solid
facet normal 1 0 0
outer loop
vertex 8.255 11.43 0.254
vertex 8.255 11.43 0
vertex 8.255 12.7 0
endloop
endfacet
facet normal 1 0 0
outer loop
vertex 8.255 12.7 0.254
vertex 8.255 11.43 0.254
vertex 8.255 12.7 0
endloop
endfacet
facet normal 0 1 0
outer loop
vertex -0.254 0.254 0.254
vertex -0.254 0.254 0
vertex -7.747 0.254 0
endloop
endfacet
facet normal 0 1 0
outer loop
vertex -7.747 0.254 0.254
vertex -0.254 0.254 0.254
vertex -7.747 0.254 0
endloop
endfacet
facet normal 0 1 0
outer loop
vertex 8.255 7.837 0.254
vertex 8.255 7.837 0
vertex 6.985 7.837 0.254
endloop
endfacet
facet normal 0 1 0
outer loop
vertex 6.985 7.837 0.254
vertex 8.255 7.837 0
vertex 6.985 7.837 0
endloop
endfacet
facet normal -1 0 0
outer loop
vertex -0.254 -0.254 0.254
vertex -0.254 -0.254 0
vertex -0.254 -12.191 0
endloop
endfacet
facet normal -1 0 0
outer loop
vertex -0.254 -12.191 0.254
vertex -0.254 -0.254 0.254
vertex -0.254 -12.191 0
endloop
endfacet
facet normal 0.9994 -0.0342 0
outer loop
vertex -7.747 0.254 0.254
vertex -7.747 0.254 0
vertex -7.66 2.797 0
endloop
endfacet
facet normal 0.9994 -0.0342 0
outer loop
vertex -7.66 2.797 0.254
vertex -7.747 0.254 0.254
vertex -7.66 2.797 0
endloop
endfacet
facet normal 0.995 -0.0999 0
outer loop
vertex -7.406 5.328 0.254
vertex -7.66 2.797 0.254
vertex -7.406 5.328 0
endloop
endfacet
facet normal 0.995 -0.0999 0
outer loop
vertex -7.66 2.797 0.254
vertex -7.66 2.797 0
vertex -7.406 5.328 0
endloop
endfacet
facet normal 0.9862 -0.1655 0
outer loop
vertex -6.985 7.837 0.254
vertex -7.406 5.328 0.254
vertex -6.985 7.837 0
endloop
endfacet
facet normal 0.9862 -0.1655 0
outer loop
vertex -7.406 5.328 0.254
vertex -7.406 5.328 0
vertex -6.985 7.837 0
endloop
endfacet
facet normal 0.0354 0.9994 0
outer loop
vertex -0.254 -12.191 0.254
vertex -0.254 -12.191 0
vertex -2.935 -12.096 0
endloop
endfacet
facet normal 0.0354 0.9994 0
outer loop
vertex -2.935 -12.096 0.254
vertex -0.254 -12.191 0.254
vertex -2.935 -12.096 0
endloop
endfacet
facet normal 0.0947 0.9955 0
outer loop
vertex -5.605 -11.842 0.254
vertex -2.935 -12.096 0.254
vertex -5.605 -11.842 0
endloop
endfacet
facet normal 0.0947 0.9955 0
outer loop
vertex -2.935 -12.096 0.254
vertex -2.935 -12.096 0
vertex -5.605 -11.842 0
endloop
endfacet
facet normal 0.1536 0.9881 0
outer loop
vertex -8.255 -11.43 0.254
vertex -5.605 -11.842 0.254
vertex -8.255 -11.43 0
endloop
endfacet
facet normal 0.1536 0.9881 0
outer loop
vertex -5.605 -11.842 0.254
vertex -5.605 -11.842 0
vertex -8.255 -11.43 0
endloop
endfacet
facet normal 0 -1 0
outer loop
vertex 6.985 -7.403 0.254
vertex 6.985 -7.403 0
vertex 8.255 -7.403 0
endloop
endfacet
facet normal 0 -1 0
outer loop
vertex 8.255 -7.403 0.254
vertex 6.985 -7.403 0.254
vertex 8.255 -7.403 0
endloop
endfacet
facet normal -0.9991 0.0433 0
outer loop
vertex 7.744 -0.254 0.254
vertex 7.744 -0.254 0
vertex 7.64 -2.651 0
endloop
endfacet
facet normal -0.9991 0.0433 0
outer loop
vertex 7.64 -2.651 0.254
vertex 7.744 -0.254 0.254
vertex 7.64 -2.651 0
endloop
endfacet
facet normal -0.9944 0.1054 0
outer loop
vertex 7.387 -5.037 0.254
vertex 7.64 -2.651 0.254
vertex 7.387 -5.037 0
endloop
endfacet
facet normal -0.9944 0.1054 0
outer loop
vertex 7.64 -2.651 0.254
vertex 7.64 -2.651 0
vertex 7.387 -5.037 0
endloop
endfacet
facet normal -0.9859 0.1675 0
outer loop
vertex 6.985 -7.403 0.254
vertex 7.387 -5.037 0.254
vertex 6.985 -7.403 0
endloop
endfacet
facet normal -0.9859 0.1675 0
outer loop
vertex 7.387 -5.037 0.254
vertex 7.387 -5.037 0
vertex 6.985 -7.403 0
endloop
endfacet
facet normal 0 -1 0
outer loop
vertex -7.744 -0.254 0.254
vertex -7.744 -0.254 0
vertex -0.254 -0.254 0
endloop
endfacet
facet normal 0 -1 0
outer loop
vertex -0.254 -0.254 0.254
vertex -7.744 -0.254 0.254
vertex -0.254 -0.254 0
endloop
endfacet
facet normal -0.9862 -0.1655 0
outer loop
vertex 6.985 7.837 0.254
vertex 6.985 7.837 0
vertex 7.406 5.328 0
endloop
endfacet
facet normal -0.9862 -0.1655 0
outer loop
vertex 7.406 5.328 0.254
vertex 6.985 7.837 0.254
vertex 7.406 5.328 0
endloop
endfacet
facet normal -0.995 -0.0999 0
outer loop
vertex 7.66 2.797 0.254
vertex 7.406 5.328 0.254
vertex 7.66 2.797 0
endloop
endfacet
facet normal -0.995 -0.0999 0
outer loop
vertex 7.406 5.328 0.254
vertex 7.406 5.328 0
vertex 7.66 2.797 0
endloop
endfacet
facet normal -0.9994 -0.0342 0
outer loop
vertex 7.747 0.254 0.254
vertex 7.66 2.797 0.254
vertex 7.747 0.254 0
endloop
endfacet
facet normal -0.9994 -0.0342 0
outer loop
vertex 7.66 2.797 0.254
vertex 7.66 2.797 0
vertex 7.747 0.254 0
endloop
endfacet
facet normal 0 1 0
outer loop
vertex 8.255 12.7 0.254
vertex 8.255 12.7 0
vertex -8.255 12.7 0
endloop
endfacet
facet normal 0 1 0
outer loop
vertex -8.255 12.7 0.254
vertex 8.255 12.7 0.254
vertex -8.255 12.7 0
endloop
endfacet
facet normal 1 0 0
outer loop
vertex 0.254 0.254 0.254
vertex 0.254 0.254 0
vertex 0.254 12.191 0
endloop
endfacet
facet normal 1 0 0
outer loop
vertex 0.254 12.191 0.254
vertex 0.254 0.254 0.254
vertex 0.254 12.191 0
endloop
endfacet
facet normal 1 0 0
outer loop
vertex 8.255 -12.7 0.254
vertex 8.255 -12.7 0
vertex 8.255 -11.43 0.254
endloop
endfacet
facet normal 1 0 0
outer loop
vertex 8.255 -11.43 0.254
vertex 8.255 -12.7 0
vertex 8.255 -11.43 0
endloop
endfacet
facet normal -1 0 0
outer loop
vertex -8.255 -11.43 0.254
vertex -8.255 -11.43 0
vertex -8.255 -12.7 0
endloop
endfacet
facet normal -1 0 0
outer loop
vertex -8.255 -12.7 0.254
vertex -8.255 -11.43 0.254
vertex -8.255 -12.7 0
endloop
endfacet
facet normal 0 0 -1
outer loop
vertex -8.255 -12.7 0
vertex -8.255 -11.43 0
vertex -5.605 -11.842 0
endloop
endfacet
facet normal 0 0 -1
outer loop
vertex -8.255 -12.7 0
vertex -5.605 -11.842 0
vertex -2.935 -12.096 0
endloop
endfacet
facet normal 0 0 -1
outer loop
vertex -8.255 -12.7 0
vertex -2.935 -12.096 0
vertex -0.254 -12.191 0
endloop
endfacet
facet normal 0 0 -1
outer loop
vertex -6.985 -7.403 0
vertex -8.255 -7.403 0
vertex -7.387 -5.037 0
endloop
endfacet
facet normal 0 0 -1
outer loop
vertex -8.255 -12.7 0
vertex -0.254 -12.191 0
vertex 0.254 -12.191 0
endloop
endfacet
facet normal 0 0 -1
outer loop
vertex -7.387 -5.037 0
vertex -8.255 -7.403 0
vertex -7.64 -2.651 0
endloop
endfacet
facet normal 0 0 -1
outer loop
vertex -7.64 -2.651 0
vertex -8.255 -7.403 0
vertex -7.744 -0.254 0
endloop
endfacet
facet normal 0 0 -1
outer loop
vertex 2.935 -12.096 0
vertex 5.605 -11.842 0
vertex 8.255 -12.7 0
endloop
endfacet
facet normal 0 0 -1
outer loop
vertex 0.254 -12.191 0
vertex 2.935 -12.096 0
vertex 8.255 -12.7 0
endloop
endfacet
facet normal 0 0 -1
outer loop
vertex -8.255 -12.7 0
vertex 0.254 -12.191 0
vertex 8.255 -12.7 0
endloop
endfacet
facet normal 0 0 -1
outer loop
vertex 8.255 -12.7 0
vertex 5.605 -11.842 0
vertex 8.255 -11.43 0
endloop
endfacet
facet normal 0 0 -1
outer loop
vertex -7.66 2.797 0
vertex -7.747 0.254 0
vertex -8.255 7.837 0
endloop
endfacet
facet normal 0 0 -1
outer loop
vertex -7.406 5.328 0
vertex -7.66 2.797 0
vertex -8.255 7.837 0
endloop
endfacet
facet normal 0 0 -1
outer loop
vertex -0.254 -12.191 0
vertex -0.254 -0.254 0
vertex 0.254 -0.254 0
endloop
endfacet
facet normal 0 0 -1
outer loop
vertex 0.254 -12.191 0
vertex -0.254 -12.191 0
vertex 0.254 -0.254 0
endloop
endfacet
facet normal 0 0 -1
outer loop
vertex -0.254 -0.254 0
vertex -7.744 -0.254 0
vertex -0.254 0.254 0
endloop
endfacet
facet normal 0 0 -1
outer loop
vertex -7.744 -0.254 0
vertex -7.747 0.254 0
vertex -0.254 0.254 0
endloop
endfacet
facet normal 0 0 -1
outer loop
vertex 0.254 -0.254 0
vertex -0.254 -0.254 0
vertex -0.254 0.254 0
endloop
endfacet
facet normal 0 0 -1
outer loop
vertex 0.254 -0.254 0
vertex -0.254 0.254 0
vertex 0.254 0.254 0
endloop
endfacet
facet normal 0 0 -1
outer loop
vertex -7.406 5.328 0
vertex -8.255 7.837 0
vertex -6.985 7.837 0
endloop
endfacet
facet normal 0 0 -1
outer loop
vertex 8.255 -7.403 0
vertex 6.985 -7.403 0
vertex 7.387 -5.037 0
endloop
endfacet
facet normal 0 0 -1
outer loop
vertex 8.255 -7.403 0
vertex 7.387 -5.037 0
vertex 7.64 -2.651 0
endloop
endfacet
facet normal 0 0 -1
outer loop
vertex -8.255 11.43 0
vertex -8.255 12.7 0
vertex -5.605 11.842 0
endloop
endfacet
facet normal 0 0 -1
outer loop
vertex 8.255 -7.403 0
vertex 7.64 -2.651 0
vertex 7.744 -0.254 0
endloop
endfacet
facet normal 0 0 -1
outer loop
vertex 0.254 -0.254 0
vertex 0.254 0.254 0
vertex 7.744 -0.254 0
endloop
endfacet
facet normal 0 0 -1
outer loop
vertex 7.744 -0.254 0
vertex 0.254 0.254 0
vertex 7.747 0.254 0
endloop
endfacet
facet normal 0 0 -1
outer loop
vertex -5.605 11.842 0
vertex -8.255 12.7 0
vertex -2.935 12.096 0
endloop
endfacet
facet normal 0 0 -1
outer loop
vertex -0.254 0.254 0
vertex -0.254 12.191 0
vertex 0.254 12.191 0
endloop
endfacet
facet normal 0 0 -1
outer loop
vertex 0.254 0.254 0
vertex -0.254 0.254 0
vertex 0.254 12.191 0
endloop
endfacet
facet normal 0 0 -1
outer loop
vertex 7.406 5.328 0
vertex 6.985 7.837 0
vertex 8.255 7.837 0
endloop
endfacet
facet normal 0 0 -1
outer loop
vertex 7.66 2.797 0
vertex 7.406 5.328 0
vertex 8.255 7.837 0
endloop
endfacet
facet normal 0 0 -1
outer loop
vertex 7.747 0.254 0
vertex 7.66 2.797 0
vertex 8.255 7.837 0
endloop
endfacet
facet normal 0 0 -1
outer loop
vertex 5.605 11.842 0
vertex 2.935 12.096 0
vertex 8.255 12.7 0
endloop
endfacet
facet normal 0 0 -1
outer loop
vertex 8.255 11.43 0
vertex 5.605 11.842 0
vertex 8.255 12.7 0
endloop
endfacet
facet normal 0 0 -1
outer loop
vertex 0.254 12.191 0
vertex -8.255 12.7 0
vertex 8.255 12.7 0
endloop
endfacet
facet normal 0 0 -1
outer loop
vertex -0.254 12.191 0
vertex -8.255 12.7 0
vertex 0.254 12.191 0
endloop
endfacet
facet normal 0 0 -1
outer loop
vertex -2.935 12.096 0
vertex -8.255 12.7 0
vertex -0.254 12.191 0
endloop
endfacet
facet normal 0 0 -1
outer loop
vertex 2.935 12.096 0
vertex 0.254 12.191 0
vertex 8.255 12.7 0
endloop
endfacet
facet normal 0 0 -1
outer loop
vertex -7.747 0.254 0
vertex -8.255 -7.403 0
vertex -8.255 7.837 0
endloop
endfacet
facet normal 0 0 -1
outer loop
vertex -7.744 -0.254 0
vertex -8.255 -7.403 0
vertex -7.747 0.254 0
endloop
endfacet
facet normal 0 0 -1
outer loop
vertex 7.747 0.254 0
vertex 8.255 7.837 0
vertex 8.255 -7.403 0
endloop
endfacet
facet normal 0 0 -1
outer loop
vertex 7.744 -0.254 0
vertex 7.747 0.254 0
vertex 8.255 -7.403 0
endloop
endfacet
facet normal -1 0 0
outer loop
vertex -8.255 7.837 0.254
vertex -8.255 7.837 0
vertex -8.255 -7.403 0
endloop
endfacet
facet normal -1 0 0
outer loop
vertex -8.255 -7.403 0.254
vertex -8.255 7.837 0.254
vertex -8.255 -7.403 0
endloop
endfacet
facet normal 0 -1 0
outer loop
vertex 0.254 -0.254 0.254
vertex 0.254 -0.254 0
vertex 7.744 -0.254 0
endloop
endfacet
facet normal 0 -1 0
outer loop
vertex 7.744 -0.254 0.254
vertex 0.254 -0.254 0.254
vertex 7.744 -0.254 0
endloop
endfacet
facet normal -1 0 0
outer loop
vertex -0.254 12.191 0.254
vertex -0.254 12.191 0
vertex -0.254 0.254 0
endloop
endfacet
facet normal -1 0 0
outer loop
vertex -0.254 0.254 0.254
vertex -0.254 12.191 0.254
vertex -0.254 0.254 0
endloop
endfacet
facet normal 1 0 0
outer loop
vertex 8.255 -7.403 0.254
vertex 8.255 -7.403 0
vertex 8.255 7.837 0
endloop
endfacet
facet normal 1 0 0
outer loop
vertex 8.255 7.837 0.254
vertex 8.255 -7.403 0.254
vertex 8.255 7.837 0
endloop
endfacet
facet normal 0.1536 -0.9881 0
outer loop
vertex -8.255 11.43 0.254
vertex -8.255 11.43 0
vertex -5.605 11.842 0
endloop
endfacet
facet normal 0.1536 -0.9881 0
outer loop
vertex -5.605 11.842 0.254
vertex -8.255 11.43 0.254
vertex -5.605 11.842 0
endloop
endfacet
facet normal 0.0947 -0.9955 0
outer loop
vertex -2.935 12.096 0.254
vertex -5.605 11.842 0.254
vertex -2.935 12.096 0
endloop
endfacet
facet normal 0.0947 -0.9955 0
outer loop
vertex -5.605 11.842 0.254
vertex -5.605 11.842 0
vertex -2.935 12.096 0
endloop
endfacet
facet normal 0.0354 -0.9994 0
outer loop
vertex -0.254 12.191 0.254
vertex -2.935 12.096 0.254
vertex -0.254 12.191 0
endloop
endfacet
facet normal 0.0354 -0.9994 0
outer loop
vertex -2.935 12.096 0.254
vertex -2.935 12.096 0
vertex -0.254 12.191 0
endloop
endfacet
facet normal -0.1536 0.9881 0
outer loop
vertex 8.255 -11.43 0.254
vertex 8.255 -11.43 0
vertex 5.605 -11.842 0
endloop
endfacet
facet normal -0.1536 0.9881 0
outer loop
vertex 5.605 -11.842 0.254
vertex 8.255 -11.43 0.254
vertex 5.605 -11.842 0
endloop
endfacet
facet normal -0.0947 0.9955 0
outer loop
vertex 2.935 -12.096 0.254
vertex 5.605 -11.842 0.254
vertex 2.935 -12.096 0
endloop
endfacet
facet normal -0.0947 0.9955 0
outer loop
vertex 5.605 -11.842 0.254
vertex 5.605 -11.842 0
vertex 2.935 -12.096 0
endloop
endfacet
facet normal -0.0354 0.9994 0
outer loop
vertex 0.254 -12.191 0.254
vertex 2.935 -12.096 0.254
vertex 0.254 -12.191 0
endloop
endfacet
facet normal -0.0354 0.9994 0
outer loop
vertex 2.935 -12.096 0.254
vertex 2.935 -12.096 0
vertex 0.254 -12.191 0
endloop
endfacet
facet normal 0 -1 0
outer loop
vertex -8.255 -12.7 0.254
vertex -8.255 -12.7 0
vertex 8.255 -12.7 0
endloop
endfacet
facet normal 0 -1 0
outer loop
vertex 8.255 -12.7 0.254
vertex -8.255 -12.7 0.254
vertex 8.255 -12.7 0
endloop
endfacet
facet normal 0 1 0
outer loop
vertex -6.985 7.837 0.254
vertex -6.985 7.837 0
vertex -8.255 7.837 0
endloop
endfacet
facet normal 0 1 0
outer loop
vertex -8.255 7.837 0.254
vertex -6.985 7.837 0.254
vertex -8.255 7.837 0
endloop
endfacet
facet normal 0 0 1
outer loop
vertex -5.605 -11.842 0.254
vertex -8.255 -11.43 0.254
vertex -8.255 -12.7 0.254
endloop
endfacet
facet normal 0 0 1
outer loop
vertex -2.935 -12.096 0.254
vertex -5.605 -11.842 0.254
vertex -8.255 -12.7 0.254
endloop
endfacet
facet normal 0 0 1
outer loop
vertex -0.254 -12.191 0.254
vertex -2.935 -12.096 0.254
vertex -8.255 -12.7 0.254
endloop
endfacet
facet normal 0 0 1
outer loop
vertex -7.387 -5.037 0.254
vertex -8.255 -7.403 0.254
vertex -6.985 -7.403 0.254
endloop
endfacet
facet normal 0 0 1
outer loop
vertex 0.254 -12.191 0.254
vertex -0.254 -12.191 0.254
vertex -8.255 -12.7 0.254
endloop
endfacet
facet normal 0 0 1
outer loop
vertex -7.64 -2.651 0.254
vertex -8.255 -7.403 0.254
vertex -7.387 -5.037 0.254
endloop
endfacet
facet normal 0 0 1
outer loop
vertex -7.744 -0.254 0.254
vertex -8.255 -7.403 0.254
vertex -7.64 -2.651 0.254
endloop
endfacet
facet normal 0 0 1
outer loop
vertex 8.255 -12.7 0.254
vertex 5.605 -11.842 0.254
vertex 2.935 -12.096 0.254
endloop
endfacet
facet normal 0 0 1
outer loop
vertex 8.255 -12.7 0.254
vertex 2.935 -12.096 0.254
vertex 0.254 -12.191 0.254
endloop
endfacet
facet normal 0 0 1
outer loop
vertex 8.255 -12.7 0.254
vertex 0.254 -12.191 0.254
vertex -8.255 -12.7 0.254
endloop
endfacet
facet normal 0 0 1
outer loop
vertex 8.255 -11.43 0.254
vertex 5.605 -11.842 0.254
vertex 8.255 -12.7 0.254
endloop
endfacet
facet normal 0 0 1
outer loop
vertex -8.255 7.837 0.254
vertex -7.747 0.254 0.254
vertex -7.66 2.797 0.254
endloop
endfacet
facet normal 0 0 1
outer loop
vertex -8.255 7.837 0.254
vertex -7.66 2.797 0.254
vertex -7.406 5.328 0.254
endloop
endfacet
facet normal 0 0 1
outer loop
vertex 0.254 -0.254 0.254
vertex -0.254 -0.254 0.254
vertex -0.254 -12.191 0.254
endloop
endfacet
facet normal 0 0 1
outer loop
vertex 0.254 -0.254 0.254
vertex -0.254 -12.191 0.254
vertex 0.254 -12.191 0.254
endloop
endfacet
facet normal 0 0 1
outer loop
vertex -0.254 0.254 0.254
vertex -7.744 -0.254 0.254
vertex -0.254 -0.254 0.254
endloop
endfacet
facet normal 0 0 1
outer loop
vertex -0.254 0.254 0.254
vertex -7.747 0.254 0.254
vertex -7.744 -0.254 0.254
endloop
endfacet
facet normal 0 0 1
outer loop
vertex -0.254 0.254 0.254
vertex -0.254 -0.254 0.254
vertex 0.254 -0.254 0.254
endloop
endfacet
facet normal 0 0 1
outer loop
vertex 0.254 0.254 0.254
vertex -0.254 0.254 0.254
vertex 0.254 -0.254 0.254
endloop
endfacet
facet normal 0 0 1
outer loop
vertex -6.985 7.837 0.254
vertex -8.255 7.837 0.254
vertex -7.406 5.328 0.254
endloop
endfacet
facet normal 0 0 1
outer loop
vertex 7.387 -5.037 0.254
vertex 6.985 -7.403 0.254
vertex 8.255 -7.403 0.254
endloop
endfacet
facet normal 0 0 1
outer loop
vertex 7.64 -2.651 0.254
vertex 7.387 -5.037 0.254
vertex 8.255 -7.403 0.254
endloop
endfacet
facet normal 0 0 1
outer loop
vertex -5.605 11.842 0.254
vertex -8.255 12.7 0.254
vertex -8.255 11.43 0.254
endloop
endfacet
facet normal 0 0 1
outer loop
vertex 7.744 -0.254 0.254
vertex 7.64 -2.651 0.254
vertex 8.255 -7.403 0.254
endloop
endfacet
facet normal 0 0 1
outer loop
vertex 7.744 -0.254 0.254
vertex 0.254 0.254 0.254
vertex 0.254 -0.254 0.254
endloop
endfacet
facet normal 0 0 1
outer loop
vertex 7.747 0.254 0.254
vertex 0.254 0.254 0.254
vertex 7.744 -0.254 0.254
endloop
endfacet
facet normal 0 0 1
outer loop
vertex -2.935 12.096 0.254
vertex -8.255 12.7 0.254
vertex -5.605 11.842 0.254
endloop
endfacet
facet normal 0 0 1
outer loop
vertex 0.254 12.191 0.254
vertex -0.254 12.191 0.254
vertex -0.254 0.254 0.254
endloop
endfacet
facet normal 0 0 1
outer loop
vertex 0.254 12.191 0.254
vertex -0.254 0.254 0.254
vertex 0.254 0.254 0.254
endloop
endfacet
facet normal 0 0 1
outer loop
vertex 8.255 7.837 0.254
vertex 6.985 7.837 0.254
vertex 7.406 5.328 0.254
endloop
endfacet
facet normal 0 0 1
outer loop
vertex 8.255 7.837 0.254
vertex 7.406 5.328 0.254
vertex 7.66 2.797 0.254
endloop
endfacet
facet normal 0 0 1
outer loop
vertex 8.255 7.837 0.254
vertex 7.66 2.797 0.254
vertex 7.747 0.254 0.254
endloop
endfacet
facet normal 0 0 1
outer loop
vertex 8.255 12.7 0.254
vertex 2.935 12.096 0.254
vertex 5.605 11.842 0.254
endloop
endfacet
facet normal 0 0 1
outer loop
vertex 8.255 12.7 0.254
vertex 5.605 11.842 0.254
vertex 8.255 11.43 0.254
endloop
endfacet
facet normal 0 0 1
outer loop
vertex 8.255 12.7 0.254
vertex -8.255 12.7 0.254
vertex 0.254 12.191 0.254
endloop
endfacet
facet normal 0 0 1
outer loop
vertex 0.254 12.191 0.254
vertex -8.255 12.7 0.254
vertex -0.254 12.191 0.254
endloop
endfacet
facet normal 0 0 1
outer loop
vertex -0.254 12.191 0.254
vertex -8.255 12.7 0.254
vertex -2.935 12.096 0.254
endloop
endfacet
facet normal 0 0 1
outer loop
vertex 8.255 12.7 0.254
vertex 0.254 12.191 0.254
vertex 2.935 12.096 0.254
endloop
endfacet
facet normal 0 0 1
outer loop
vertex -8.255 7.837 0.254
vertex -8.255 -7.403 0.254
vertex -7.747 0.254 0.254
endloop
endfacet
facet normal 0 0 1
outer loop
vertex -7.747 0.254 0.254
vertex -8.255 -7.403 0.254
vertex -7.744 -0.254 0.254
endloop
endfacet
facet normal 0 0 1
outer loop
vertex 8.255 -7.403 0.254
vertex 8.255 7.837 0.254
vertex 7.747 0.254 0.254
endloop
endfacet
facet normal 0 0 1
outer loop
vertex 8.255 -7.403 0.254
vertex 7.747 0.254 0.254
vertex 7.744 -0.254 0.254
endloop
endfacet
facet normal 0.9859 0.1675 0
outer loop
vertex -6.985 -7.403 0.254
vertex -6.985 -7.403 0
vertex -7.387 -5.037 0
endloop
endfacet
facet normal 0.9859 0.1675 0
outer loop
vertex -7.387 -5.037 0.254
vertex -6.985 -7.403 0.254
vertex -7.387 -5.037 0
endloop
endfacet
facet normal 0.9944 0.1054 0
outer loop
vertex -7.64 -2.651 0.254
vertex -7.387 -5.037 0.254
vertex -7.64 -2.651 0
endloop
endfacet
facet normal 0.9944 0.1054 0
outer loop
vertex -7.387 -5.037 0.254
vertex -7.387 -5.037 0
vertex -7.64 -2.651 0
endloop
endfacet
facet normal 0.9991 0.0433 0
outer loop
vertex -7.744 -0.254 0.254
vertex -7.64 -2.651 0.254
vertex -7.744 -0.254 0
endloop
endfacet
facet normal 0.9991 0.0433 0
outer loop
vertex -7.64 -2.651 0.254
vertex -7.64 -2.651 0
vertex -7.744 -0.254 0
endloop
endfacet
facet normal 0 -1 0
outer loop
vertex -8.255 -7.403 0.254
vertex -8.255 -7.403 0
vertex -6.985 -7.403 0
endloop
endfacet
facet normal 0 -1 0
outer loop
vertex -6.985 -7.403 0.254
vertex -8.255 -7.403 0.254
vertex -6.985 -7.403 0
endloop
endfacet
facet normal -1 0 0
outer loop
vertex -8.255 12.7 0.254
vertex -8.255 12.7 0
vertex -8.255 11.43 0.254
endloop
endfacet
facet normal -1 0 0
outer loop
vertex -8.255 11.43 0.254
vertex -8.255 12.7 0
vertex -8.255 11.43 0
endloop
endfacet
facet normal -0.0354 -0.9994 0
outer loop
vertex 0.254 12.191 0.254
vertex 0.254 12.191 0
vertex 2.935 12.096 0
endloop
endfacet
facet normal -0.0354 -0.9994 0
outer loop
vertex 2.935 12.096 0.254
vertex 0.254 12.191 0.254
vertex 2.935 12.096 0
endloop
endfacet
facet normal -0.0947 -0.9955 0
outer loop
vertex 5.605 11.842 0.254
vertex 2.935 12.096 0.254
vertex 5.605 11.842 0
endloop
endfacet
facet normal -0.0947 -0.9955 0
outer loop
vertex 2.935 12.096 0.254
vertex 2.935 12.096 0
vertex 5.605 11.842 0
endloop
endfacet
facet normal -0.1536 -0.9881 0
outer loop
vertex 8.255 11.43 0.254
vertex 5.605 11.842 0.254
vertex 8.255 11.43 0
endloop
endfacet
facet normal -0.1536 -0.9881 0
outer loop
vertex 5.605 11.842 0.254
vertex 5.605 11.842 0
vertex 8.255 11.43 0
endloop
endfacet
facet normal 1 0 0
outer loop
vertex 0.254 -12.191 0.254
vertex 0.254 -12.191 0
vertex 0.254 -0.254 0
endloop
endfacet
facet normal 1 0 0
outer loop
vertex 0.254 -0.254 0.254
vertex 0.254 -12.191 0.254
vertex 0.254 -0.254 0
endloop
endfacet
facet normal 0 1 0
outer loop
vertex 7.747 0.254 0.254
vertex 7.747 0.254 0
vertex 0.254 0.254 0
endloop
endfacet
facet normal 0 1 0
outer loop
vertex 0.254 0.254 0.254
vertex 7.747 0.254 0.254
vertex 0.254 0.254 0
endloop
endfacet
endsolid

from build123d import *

# Parameters (mm, degrees)
F1_DEPTH = 0.254


with BuildPart() as f1:
    # F0 (on Top) → F1 (new body)
    with BuildSketch(Plane.XY):
        with BuildLine():
            Line((8.255, 12.7), (-8.255, 12.7))
            Line((-8.255, 12.7), (-8.255, 11.43))
            ThreePointArc((-8.255, 11.43), (-4.271494, 11.989244), (-0.254, 12.191285))
            Line((-0.254, 12.191285), (-0.254, 0.254))
            Line((-0.254, 0.254), (-7.746982, 0.254))
            ThreePointArc((-7.746982, 0.254), (-7.554177, 4.06437), (-6.985, 7.83692))
            Line((-6.985, 7.83692), (-8.255, 7.83692))
            Line((-8.255, 7.83692), (-8.255, -7.40308))
            Line((-8.255, -7.40308), (-6.985, -7.40308))
            ThreePointArc((-6.985, -7.40308), (-7.53188, -3.846307), (-7.744118, -0.254))
            Line((-7.744118, -0.254), (-0.254, -0.254))
            Line((-0.254, -0.254), (-0.254, -12.191285))
            ThreePointArc((-0.254, -12.191285), (-4.271494, -11.989244), (-8.255, -11.43))
            Line((-8.255, -11.43), (-8.255, -12.7))
            Line((-8.255, -12.7), (8.255, -12.7))
            Line((8.255, -12.7), (8.255, -11.43))
            ThreePointArc((8.255, -11.43), (4.271494, -11.989244), (0.254, -12.191285))
            Line((0.254, -12.191285), (0.254, -0.254))
            Line((0.254, -0.254), (7.744118, -0.254))
            ThreePointArc((7.744118, -0.254), (7.53188, -3.846307), (6.985, -7.40308))
            Line((6.985, -7.40308), (8.255, -7.40308))
            Line((8.255, -7.40308), (8.255, 7.83692))
            Line((8.255, 7.83692), (6.985, 7.83692))
            ThreePointArc((6.985, 7.83692), (7.554177, 4.06437), (7.746982, 0.254))
            Line((7.746982, 0.254), (0.254, 0.254))
            Line((0.254, 0.254), (0.254, 12.191285))
            ThreePointArc((0.254, 12.191285), (4.271494, 11.989244), (8.255, 11.43))
            Line((8.255, 11.43), (8.255, 12.7))
        make_face()
    extrude(amount=F1_DEPTH)


solid = f1.part
